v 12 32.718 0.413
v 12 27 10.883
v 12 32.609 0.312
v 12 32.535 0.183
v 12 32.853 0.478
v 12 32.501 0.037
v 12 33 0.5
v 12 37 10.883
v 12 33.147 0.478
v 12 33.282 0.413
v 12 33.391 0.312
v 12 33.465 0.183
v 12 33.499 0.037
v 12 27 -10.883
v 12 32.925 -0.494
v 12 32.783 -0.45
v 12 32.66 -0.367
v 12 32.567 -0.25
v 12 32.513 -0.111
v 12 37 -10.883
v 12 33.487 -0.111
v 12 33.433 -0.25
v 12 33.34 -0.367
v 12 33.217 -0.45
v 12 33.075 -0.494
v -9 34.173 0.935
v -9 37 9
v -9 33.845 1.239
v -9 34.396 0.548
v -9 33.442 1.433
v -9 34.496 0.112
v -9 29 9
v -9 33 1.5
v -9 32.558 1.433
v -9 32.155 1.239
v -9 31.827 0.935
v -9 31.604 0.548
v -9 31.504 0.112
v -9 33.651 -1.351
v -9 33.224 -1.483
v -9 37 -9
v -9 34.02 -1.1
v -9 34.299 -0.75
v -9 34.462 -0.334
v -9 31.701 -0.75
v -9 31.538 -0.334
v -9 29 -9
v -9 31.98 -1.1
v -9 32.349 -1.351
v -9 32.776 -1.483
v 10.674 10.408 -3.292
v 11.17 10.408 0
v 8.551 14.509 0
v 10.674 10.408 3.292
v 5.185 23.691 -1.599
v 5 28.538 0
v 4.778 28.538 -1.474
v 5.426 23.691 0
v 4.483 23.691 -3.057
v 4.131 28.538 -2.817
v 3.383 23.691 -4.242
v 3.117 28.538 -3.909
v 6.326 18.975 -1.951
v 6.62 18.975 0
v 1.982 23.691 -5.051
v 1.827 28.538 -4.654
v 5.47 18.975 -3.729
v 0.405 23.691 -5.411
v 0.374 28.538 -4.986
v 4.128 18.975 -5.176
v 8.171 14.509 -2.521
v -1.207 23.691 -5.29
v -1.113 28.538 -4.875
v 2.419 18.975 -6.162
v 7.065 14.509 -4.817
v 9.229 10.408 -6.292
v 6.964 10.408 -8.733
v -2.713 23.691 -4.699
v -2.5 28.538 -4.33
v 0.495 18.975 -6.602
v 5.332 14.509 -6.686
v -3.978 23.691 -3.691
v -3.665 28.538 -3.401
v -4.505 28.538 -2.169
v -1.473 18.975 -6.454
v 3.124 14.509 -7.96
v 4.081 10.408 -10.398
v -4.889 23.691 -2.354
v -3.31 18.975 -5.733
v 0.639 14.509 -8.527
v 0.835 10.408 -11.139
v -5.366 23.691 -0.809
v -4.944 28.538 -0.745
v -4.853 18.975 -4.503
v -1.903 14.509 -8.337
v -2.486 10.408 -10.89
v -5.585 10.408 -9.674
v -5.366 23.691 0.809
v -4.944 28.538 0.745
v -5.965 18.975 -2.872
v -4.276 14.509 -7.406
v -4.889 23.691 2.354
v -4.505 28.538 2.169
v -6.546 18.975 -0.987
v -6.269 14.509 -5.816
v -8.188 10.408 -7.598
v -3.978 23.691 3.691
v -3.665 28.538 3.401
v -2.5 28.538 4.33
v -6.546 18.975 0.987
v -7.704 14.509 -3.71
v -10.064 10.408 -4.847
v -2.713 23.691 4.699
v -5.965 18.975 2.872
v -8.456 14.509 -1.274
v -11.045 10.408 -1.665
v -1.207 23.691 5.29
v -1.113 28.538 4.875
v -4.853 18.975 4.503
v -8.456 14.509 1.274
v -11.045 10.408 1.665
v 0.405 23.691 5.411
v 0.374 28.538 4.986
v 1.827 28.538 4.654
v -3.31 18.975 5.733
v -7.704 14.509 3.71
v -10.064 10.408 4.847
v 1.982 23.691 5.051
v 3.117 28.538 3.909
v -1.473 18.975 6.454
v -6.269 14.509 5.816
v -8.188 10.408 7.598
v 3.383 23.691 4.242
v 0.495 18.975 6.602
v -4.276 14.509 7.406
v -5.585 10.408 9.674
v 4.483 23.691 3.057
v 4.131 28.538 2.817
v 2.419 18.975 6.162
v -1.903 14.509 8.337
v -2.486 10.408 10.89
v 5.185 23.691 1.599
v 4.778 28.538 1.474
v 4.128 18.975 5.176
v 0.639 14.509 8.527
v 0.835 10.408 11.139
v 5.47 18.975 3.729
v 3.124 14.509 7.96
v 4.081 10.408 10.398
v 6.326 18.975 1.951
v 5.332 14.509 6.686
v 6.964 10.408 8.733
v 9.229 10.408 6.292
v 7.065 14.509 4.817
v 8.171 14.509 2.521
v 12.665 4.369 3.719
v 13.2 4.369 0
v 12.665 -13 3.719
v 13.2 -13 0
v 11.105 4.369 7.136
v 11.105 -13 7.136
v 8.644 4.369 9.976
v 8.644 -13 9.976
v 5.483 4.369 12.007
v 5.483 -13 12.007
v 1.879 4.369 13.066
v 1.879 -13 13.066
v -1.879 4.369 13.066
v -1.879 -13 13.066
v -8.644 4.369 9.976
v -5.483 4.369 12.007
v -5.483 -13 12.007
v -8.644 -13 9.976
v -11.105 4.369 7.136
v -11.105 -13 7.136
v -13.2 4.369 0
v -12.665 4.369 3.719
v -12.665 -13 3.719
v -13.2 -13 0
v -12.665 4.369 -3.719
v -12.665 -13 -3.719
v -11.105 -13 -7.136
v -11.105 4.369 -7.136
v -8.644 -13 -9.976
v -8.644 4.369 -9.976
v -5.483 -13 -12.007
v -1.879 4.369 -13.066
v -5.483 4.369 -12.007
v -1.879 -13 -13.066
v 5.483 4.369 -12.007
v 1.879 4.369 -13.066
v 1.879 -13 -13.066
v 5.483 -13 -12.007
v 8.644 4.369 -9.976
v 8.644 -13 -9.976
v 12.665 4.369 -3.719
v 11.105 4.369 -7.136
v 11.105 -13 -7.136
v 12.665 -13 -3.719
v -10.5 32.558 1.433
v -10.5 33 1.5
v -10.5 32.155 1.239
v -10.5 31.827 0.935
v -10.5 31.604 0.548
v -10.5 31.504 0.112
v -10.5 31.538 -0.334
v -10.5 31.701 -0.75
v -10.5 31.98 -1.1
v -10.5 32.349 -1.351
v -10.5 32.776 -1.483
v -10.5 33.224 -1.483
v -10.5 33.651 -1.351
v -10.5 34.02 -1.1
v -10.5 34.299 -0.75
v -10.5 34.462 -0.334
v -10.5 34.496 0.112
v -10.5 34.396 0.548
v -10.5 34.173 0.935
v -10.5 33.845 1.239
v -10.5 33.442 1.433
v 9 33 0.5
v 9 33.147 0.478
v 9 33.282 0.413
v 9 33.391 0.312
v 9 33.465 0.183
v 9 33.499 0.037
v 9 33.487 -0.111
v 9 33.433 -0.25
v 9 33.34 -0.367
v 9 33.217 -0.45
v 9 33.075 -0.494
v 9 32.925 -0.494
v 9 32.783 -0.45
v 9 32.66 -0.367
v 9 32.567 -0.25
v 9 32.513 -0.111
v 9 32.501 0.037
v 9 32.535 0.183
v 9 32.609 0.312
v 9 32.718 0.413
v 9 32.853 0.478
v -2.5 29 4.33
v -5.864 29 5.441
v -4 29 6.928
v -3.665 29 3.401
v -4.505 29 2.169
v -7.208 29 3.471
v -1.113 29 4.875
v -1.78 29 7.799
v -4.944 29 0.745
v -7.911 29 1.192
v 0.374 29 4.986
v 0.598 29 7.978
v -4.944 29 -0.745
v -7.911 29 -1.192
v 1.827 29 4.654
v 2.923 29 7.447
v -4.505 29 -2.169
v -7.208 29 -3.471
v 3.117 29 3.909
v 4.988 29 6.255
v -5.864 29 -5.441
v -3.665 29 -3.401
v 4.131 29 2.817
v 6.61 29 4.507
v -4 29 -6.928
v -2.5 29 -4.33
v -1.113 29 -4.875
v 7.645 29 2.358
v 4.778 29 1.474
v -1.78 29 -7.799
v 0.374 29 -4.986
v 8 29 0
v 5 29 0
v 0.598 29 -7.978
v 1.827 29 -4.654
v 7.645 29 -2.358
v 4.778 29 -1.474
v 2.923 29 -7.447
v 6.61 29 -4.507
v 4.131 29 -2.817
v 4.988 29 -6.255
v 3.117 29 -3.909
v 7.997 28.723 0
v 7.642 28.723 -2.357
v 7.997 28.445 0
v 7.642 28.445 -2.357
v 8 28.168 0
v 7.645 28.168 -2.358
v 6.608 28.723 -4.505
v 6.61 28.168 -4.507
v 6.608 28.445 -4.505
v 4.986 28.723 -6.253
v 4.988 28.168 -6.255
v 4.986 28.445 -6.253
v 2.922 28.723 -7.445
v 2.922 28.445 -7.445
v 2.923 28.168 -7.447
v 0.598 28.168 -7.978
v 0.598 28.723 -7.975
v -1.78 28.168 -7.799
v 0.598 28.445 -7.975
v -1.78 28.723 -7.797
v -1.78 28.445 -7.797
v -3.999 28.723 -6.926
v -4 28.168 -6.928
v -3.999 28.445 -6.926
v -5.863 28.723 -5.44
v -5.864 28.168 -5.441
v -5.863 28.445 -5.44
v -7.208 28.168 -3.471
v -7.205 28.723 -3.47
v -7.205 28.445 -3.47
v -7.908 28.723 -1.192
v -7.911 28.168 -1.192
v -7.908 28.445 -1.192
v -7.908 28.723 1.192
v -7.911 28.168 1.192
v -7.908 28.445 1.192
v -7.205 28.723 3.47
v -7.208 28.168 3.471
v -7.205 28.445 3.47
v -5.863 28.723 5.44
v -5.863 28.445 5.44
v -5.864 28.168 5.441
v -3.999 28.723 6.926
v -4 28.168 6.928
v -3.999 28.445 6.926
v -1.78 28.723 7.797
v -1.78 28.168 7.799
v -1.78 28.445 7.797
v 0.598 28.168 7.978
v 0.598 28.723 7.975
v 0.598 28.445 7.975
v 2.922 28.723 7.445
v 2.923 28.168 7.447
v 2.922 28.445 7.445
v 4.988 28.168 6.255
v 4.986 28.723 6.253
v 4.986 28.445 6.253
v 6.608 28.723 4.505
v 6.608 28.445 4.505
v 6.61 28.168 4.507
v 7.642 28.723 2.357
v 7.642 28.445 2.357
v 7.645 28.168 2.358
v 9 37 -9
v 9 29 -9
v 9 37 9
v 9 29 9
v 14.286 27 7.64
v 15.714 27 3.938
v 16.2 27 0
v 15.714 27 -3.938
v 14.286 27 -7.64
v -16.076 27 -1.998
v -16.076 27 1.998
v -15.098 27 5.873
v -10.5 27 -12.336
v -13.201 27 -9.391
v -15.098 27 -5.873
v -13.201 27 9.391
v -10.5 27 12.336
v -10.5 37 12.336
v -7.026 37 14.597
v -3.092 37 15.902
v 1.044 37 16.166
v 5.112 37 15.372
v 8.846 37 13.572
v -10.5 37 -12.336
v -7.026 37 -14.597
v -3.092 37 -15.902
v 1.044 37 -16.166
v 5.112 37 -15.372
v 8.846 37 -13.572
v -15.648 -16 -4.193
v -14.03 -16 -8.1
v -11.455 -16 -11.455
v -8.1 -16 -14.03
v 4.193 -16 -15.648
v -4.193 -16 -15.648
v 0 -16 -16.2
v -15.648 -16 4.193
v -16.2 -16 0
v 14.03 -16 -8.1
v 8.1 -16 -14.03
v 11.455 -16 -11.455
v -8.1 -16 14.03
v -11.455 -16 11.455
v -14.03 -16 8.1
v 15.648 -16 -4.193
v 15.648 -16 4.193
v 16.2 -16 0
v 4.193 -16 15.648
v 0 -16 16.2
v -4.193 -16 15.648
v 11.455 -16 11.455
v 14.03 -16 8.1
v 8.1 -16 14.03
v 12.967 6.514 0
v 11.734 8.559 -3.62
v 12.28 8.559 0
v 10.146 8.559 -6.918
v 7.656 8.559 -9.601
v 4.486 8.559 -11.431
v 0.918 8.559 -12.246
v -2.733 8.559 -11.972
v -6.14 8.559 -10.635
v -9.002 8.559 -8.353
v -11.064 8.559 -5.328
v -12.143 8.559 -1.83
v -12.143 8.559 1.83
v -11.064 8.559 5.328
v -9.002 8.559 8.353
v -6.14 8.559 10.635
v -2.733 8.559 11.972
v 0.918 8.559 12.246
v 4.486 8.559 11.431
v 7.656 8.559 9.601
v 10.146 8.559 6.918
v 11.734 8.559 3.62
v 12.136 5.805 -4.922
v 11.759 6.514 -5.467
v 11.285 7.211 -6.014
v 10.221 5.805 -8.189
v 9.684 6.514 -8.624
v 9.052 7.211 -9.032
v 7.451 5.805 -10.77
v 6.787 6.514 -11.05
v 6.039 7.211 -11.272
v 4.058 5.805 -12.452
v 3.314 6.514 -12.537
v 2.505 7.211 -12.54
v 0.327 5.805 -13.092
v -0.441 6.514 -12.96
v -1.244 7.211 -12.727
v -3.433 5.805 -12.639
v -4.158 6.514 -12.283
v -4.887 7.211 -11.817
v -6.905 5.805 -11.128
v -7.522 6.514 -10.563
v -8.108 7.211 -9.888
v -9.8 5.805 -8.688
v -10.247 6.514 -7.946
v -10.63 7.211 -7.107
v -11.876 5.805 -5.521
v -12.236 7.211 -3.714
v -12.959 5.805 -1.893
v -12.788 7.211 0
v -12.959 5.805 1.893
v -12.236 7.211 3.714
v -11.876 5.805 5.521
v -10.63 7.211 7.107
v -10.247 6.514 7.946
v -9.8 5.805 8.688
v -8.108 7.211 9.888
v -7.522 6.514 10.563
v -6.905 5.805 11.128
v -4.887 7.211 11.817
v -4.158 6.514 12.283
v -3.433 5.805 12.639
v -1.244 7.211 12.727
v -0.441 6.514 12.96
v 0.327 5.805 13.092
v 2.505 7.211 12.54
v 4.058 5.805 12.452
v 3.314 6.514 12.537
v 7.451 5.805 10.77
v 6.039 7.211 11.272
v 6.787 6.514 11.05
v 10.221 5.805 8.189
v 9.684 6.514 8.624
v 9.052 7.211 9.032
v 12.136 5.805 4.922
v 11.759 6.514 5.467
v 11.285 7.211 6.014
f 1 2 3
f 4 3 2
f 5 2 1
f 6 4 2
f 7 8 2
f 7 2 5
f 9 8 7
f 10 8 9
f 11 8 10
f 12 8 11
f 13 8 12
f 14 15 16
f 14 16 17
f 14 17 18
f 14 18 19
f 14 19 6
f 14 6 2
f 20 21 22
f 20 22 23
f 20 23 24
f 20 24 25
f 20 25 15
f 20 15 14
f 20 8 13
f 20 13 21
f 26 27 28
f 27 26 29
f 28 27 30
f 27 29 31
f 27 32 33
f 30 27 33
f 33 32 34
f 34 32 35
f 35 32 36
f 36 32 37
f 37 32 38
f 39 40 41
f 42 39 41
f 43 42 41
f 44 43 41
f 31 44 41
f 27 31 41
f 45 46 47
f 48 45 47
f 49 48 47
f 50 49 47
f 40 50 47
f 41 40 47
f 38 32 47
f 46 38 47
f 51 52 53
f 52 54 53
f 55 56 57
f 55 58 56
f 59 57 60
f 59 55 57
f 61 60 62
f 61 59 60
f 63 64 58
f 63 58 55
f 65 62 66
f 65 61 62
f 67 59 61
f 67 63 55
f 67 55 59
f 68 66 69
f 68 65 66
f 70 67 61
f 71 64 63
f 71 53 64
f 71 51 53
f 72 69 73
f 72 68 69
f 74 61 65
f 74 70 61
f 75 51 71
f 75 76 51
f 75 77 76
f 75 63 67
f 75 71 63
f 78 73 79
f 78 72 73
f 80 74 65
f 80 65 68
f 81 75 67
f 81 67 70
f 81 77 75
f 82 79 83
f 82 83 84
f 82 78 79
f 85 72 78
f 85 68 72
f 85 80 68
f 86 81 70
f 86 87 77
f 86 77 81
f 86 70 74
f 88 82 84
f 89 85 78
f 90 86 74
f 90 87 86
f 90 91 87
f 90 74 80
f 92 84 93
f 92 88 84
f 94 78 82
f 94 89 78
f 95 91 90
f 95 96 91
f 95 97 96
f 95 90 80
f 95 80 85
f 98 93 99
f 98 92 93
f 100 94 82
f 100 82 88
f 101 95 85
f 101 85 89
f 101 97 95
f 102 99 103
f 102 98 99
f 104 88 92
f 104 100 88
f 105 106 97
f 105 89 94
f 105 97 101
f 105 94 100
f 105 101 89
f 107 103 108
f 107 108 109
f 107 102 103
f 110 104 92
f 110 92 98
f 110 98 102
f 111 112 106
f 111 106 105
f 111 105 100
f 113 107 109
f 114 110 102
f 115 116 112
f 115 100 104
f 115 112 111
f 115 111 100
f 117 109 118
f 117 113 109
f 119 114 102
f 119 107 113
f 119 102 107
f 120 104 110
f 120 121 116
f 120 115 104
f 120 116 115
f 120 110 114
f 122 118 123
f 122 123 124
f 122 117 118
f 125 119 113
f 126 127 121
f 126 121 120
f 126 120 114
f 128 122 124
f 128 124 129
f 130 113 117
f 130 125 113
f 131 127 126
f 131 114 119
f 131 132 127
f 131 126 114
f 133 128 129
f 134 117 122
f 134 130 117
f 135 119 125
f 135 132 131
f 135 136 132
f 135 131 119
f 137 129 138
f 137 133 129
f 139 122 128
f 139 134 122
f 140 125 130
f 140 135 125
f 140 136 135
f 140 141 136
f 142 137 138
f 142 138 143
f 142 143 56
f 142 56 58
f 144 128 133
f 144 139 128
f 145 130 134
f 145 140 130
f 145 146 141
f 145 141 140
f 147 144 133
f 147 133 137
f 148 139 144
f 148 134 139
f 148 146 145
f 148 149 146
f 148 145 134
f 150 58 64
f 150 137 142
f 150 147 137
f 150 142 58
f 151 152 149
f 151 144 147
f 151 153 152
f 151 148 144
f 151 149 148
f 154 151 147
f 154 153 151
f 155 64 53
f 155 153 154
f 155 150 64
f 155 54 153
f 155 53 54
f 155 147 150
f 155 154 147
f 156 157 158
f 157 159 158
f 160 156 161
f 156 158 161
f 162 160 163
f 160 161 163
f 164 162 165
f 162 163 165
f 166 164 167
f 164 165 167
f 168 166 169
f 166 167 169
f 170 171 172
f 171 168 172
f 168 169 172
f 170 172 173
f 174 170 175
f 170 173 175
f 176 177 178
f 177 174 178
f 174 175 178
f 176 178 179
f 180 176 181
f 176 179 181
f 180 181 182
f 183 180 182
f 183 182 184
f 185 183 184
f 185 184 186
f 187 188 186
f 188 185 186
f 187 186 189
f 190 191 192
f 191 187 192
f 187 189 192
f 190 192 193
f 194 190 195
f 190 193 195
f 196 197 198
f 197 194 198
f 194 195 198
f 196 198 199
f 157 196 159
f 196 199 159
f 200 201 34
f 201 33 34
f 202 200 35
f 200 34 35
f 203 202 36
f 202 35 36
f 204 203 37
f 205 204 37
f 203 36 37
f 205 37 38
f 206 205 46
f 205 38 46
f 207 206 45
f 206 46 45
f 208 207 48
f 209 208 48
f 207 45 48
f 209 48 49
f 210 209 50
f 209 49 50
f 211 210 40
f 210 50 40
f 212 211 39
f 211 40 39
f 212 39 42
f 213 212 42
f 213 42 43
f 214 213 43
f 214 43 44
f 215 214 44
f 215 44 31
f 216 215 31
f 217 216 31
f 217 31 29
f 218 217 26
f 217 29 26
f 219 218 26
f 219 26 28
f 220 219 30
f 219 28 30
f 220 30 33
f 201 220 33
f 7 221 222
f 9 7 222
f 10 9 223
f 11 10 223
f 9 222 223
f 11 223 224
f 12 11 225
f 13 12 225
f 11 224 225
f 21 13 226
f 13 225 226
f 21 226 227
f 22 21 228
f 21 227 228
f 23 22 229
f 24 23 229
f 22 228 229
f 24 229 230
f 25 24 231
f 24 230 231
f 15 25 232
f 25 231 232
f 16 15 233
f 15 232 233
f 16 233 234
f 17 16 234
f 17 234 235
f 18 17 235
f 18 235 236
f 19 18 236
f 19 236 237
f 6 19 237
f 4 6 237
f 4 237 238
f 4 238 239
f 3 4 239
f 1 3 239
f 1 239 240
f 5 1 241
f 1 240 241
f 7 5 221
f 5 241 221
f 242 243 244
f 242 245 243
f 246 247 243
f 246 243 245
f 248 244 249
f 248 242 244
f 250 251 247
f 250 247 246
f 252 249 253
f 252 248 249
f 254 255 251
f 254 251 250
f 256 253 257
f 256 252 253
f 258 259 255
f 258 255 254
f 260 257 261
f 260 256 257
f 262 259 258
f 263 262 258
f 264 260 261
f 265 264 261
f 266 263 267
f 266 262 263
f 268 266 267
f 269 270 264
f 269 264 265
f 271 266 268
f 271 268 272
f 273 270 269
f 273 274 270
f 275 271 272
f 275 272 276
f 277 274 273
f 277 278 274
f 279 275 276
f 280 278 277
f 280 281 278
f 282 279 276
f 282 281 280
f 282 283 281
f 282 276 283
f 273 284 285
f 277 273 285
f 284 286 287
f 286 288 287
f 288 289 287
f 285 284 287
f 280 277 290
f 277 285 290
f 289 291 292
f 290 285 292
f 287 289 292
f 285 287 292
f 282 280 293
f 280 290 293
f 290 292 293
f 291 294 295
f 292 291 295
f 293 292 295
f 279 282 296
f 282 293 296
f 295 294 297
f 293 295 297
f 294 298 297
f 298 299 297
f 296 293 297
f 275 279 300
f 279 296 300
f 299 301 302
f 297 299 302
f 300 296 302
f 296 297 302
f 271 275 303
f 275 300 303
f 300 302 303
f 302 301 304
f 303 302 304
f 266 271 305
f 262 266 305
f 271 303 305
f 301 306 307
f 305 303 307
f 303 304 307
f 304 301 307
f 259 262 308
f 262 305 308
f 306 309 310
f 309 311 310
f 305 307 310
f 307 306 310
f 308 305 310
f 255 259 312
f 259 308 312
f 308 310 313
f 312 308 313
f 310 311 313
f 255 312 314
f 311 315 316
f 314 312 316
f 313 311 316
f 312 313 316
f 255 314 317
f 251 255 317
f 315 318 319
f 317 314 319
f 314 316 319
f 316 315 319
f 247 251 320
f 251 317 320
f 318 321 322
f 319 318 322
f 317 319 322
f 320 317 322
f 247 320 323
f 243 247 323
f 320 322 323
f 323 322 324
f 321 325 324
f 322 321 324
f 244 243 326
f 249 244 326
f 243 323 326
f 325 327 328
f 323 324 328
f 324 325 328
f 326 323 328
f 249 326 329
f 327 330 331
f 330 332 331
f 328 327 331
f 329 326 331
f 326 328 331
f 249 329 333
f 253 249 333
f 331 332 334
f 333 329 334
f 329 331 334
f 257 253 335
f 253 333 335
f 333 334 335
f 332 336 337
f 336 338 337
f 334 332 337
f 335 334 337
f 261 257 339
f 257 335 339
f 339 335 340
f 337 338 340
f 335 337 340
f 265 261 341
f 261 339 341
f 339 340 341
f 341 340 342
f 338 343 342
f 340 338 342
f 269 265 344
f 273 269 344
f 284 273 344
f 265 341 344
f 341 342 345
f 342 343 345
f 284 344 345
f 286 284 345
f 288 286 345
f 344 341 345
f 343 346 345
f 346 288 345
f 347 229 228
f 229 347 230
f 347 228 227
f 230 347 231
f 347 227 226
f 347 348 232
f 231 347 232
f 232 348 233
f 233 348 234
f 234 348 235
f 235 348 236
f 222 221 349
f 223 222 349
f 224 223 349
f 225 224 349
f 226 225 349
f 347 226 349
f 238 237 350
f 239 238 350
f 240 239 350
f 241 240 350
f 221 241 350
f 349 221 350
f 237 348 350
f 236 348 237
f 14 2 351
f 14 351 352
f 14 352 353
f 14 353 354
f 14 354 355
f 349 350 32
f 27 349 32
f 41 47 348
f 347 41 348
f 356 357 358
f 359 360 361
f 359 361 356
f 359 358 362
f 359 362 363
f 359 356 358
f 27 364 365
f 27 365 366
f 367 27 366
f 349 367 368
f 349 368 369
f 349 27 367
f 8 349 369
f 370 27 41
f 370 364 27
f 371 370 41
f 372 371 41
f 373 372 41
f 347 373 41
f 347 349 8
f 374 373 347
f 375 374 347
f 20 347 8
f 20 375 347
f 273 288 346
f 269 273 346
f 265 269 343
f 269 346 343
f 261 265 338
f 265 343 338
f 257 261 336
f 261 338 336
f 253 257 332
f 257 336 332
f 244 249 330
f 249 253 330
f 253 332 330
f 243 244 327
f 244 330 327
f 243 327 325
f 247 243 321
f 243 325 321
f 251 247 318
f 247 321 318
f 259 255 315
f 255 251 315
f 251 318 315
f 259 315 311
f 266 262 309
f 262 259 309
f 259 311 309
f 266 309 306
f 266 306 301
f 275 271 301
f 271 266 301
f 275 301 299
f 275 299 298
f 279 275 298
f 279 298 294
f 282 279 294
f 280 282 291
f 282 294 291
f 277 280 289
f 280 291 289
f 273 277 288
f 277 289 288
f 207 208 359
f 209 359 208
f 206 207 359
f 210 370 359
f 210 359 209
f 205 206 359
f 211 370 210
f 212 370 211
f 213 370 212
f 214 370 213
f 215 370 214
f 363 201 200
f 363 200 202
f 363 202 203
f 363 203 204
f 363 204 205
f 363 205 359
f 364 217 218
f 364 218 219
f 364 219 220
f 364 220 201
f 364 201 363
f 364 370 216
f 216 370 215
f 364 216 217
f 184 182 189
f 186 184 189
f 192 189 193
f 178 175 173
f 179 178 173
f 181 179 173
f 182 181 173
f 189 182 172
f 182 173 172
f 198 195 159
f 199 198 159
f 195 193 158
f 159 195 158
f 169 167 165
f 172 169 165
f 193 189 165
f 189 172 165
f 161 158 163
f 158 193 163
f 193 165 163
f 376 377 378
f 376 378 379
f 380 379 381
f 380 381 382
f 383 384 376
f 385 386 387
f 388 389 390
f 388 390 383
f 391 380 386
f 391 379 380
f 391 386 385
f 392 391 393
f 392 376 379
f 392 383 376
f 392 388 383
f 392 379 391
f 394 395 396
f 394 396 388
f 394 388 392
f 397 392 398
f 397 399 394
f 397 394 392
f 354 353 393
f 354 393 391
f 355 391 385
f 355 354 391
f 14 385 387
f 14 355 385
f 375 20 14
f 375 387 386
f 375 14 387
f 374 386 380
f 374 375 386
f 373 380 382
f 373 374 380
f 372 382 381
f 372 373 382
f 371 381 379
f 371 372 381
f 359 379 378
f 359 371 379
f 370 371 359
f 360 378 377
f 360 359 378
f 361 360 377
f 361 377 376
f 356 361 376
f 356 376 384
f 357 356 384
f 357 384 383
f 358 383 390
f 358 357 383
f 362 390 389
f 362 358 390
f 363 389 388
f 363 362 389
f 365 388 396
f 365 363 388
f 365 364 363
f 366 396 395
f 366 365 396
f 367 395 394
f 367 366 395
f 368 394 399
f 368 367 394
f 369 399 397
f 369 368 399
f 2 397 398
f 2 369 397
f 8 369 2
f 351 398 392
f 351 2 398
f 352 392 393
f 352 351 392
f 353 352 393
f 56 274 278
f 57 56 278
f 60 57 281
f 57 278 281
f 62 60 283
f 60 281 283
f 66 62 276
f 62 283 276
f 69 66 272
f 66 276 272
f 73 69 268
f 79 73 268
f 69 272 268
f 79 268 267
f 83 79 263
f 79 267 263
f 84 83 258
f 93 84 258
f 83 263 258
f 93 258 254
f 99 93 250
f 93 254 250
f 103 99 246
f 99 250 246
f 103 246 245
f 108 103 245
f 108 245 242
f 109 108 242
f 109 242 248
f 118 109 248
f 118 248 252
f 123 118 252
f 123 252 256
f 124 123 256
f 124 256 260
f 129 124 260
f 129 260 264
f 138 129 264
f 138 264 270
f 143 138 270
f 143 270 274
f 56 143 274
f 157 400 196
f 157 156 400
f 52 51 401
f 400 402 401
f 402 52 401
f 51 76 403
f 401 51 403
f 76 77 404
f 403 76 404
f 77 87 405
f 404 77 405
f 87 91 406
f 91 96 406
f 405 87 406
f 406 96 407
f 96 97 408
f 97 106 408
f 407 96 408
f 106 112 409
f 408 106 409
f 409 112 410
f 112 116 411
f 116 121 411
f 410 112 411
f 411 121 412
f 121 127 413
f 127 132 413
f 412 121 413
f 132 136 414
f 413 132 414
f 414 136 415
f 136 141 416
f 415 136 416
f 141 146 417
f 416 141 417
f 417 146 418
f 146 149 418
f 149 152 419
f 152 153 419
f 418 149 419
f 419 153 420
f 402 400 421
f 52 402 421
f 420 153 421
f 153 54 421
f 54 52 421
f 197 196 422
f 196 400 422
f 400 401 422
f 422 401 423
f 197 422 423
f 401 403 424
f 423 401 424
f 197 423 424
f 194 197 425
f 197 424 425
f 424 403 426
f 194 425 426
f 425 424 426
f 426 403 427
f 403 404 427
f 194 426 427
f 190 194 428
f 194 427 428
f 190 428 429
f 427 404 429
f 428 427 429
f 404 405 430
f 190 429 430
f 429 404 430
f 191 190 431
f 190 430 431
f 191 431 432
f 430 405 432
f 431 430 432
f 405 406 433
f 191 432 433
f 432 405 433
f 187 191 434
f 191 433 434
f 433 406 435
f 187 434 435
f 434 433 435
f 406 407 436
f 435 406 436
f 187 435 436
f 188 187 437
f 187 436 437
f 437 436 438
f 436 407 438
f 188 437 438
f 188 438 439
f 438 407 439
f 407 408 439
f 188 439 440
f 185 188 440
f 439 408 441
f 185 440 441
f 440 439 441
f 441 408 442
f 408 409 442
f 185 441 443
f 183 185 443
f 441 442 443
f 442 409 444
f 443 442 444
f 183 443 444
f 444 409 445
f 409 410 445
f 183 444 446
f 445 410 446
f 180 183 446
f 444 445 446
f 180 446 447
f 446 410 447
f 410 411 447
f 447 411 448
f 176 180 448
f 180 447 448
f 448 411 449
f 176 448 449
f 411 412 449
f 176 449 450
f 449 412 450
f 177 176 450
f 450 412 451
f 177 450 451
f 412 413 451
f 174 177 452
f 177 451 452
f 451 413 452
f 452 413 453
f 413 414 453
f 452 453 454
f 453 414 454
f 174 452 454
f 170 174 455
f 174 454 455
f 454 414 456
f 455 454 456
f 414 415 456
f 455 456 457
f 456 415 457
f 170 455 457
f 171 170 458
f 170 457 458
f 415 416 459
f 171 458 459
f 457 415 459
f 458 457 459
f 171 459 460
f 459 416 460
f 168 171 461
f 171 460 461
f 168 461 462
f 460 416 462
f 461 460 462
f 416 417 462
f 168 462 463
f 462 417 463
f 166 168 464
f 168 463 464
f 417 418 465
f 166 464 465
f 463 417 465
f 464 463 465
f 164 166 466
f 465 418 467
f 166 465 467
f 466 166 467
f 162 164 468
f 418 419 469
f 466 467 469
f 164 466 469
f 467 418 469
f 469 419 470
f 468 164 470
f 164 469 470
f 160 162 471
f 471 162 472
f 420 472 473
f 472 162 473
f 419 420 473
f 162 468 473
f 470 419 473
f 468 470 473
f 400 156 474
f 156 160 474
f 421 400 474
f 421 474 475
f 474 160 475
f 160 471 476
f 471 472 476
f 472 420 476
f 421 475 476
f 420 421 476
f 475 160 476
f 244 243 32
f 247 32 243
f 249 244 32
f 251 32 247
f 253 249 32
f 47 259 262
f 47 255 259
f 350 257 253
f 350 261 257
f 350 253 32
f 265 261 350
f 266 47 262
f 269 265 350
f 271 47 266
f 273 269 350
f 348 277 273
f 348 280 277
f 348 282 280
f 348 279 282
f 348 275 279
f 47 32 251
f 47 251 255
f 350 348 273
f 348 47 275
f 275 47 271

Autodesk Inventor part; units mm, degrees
ref_plane "YZ Plane" through (0, 0, 0) normal (1, 0, 0) x (0, 1, 0)
ref_plane "XZ Plane" through (0, 0, 0) normal (0, 1, 0) x (-1, 0, 0)
ref_plane "XY Plane" through (0, 0, 0) normal (0, 0, 1) x (1, 0, 0)
sketch "Esboço1" plane through (0, 0, 0) normal (0, 0, 1) x (1, 0, 0)
  line L0 (0, 0) -> (14.7, 0)
  line L1 (14.7, 0) -> (16.2, 0)
  line L2 (16.2, 0) -> (16.2, 4.3403)
  line L3 (16.2, 50) -> (14.7, 50)
  line L4 (14.7, 50) -> (13.2, 50)
  line L5 (13.2, 4.3688) -> (13.2, 0)
  line L6 (0, 0) -> (0, 50)
  line L7 (0, 0) -> (5, 0)
  line L8 (5, 28.5381) -> (5, 50)
  line L9 (8, 29) -> (42.1402, 29)
  line L10 (15.5063, 8) -> (35.5749, 8)
  arc A0 (5, 29) -> (11.1701, 10.4085) centre (35.3987, 28.769) ccw
  arc A1 (13.2, 4.3688) -> (11.1701, 10.4085) centre (3.2, 4.3688) ccw
  line L11 (5, 50) -> (8, 50)
  arc A2 (8, 29) -> (14.1456, 10.4122) centre (37.9251, 28.5841) ccw
  arc A3 (16.2, 4.3403) -> (14.1456, 10.4122) centre (6.2, 4.3403) ccw
  line L12 (8, 50) -> (8, 28.1681)
  line L13 (14.7, 0) -> (14.7, 4)
  line L14 (14.7, 9.6081) -> (14.7, 50)
  line L15 (16.2, 4) -> (35.5749, 4)
  line L16 (0, 32) -> (45.564, 32)
  line L17 (16.2, 0) -> (16.2, 50)
  line L18 (8, 29) -> (0, 29)
  line L19 (13.2, 50) -> (13.2, 29)
  line L20 (0, 37) -> (42.1402, 37)
  point P0 (13.2, 8)
  point P1 (16.2, 8)
  point P2 (16.2, 8)
  point P3 (16.2, 29)
  point P4 (8, 32)
  point P5 (5, 32)
  point P6 (5, 29)
  point P7 (16.2, 37)
  point P8 (8, 37)
  point P9 (13.2, 37)
  dimension "d15" = 14.7
  dimension "d16" = 50
  dimension "d17" = 1.5
  dimension "d18" = 1.5
  dimension "d20" = 5
  dimension "d23" = 10
  dimension "d24" = 3
  dimension "d25" = 10
  dimension "d27" = 3
  dimension "d28" = 5
revolve "Revolução1" add sketch "Esboço1" angle 360 about axis through (0, 0, 0) along (0, 1, 0) contours L5 A1 A0 L8 L18 A2 A3 L2 L1 L0 | L9 L14 A3 A2 L12 | L19 L16 L14 L9 | L19 L20 L14 L16 | L14 L16 L17 L9 | L9 L17 L10 A3 L14 | A3 L10 L17 | L14 L20 L17 L16
sketch "Esboço2" plane through (0, 29, 0) normal (0, 1, 0) x (1, 0, 0)
  circle A0 centre (0, 0) radius 13.2
  line L0 (9, -9) -> (-9, -9)
  line L1 (-9, -9) -> (-9, 9)
  line L2 (-9, 9) -> (9, 9)
  line L3 (9, 9) -> (9, -9)
  line L4 (9, -9) -> (-9, 9) construction
  line L5 (-9, -9) -> (9, 9) construction
  dimension "d29" = 18
  dimension "d30" = 18
extrude "Extrusão1" add sketch "Esboço2" along normal blind 8
sketch "Esboço3" plane through (0, 0, 0) normal (0, -1, 0) x (1, 0, 0)
  circle A0 centre (0, 0) radius 13.2
  circle A1 centre (0, 0) radius 16.2
extrude "Extrusão2" add sketch "Esboço3" along normal blind 10
sketch "Esboço4" plane through (0, -10, 0) normal (0, -1, 0) x (1, 0, 0)
  circle A0 centre (0, 0) radius 16.2
  circle A1 centre (0, 0) radius 13.2
extrude "Extrusão3" add sketch "Esboço4" along normal blind 3
sketch "Esboço6" plane through (0, -13, 0) normal (0, -1, 0) x (1, 0, 0)
  circle A0 centre (0, 0) radius 16.2
extrude "Extrusão4" add sketch "Esboço6" along normal blind 3
sketch "Esboço7" plane through (9, 29, -9) normal (-1, 0, 0) x (0, 0, 1)
  circle A0 centre (9, 4) radius 0.5
  line L0 (18, 0) -> (0, 0) projected
  point P0 (9, -29)
  point P1 (9, 0)
  dimension "d39" = 1
  dimension "d40" = 4
extrude "Extrusão5" cut sketch "Esboço7" against normal blind 43.25
sketch "Esboço9" plane through (0, 37, 0) normal (0, 1, 0) x (1, 0, 0)
  circle A0 centre (0, 0) radius 16.2 projected
  line L0 (-10.5, 12.3365) -> (-10.5, -12.3365)
  line L1 (-9, -9) -> (-9, 9) projected
  circle A1 centre (0, 0) radius 16.2
  line L2 (12, -10.883) -> (12, 10.883)
  line L3 (9, 9) -> (9, -9) projected
  dimension "d43" = 1.5
  dimension "d48" = 3
extrude "Extrusão6" cut sketch "Esboço9" against normal blind 10 contours L0 A0
sketch "Esboço10" plane through (9, 29, -9) normal (-1, 0, 0) x (0, 0, 1)
  circle A0 centre (9, 4) radius 0.5 projected
  circle A1 centre (9, 4) radius 1.5
  point P0 (9, -29)
extrude "Extrusão7" cut sketch "Esboço10" along normal blind 43.25 contours A0 | A1
extrude "Extrusão8" cut sketch "Esboço9" against normal blind 10 contours A0 L2
properties part number "Peça2_3DPrint"
